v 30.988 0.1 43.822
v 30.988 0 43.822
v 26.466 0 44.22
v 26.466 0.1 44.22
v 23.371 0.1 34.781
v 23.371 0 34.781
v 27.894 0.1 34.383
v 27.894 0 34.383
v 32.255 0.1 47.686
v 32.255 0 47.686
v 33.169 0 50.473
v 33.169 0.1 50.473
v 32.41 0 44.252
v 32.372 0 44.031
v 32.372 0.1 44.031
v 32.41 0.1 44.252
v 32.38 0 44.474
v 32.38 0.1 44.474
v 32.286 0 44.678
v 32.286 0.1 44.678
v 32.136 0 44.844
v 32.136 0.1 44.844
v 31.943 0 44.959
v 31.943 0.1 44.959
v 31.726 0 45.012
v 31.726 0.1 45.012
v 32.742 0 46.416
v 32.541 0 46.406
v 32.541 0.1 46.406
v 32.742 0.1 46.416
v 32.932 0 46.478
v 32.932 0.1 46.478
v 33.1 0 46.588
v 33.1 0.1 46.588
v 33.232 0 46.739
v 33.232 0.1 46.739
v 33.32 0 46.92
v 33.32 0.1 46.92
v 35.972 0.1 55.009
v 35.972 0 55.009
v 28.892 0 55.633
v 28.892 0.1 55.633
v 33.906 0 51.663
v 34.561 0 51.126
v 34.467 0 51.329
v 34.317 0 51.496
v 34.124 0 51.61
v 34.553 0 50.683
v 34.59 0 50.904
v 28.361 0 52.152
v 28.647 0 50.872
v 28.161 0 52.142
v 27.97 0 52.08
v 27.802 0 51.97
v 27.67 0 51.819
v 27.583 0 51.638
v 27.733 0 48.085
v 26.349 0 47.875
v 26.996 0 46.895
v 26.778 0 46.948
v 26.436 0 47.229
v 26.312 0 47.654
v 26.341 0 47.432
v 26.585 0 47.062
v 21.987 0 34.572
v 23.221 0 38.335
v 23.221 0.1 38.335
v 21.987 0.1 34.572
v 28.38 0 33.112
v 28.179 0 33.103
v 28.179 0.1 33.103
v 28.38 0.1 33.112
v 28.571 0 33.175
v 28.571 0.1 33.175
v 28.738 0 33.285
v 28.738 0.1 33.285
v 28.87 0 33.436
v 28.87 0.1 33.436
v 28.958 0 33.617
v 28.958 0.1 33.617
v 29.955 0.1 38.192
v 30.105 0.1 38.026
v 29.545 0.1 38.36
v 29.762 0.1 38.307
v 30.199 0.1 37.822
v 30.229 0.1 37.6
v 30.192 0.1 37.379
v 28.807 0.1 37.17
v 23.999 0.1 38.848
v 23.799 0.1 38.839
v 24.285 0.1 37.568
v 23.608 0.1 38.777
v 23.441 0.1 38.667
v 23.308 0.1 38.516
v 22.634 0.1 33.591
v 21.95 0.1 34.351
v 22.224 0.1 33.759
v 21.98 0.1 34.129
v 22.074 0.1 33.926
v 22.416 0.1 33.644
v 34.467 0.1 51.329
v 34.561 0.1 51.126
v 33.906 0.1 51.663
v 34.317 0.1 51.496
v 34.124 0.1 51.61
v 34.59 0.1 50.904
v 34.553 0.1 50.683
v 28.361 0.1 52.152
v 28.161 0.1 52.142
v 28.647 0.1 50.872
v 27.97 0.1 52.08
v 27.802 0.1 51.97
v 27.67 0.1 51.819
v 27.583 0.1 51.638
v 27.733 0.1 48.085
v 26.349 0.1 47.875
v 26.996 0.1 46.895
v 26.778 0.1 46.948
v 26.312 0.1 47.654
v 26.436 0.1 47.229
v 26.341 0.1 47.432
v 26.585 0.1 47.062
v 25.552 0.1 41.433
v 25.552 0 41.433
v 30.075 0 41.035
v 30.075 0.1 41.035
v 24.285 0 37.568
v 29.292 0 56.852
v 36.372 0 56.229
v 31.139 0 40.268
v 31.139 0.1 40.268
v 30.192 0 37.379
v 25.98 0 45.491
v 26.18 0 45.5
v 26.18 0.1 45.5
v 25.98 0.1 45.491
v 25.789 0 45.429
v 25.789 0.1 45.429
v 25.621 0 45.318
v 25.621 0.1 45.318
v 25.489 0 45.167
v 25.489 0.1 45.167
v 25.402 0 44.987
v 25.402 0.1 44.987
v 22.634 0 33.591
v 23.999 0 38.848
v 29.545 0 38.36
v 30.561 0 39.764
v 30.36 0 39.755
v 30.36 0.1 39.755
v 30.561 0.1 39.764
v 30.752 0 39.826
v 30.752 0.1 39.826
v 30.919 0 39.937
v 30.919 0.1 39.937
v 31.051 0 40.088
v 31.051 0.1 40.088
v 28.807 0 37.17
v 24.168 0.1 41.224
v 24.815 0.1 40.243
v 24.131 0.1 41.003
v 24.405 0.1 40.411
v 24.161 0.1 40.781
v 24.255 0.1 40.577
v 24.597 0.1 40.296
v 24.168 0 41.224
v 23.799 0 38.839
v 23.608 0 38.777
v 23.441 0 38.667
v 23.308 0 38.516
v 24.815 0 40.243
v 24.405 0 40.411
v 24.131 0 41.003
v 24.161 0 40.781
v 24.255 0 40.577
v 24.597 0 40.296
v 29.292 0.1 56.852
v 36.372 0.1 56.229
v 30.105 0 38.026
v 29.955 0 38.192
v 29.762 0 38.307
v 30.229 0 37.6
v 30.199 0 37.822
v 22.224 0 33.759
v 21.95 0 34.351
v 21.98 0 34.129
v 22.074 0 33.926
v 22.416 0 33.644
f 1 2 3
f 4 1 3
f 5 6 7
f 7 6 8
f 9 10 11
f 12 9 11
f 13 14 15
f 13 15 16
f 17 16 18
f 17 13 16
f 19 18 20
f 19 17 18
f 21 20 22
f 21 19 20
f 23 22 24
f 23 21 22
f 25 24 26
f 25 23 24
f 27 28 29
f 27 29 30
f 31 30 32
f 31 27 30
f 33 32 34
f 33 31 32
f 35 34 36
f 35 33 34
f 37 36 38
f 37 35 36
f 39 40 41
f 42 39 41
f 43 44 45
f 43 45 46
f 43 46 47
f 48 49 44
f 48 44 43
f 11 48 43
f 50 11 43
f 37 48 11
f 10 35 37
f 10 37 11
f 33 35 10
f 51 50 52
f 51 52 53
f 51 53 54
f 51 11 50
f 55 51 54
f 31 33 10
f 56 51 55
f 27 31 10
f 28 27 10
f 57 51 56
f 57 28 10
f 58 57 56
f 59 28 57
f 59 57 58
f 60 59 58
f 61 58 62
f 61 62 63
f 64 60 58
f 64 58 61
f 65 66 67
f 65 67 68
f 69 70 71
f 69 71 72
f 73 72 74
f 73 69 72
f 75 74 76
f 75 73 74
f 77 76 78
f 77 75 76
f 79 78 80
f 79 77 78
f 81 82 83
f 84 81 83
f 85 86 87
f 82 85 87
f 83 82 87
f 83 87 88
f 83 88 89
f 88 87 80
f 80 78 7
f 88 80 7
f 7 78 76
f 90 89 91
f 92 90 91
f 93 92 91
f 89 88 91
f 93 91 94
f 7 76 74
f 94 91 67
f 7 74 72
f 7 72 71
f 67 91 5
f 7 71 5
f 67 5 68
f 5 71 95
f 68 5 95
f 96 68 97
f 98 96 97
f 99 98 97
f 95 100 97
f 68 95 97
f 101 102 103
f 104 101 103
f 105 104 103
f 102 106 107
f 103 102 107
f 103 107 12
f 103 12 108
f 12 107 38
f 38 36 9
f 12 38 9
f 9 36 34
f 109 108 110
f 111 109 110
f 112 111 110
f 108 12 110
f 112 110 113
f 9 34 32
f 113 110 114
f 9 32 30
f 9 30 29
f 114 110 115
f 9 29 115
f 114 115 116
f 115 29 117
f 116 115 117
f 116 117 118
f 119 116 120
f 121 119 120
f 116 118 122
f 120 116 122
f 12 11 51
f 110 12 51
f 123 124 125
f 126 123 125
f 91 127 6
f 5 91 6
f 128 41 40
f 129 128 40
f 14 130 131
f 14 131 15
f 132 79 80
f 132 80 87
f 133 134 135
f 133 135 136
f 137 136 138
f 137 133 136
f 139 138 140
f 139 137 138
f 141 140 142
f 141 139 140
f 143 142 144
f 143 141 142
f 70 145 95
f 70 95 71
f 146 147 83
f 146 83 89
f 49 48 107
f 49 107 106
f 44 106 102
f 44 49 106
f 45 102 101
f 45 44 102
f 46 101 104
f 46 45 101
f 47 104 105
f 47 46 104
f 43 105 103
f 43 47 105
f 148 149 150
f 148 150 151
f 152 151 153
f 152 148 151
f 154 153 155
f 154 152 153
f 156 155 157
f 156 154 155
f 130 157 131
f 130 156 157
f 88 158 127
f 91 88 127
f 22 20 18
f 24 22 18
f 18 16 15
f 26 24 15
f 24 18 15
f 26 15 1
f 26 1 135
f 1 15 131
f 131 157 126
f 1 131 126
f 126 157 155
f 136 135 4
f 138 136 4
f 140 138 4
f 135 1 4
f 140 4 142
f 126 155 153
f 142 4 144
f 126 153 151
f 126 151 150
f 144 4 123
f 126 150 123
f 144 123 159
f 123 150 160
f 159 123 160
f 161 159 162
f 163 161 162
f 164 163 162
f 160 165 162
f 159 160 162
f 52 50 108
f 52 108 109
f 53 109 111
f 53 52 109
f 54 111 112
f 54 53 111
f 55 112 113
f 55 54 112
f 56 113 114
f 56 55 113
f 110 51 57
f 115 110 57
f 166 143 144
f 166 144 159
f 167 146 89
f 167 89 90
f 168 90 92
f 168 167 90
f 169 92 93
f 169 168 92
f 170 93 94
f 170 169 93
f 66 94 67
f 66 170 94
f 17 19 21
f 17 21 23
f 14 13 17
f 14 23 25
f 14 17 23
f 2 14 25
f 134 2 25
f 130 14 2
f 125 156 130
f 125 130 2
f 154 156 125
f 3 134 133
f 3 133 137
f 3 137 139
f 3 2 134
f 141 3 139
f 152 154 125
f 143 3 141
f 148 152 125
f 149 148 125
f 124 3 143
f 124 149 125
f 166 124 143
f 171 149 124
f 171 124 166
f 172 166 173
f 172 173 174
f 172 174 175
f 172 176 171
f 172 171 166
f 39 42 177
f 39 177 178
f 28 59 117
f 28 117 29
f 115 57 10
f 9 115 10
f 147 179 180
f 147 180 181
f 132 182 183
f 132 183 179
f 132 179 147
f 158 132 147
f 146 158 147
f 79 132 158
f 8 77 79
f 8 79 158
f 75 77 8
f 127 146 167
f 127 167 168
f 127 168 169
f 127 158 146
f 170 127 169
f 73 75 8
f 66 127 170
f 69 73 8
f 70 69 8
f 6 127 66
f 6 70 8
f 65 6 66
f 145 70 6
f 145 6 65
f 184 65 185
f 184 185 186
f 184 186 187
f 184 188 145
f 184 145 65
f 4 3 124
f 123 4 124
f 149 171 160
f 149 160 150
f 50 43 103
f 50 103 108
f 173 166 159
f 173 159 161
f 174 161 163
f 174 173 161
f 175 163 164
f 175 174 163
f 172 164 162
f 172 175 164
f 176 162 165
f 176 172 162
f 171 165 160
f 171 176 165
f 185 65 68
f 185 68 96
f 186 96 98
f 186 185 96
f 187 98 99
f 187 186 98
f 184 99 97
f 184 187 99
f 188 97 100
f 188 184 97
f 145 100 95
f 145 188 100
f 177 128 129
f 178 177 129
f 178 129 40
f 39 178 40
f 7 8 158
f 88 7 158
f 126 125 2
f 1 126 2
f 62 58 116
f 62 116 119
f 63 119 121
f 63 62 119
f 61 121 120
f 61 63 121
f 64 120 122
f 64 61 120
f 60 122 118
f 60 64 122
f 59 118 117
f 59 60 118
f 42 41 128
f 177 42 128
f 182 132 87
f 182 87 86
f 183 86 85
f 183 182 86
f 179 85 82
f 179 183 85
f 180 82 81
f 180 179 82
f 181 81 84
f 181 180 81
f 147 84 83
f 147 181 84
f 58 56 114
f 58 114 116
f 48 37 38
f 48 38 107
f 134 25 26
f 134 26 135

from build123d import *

# Parameters (mm, degrees)
BOSS_EXTRUDE1_DEPTH   = 0.1
BOSS_EXTRUDE1_2_DEPTH = 0.1
BOSS_EXTRUDE1_3_DEPTH = 0.1
BOSS_EXTRUDE1_4_DEPTH = 0.1


with BuildPart() as part:
    # Sketch1 → Boss-Extrude1 (new body)
    with BuildSketch(Plane(origin=(0, 0, 0), x_dir=(1, 0, 0), z_dir=(0, 1, 0))):
        with BuildLine():
            Line((24.814936785, -40.243096001), (30.360245664, -39.754754547))
            ThreePointArc((30.360245664, -39.754754547), (30.838979213, -39.875779803), (31.138711106, -40.268200133))
            Line((31.138711106, -40.268200133), (32.372388114, -44.03091501))
            ThreePointArc((32.372388114, -44.03091501), (32.285799291, -44.677518274), (31.725509245, -45.0116866))
            Line((31.725509245, -45.0116866), (26.180200366, -45.500028055))
            ThreePointArc((26.180200366, -45.500028055), (25.701466817, -45.379002798), (25.401734924, -44.986582468))
            Line((25.401734924, -44.986582468), (24.168057915, -41.223867592))
            ThreePointArc((24.168057915, -41.223867592), (24.254646739, -40.577264327), (24.814936785, -40.243096001))
        make_face()
        Polygon((25.55210278, -41.433015967), (30.074567356, -41.034750158), (30.98834325, -43.821766634), (26.465878674, -44.220032443), align=None, mode=Mode.SUBTRACT)
    extrude(amount=BOSS_EXTRUDE1_DEPTH)


with BuildPart() as body_2:
    # Sketch1 → Boss-Extrude1 2 (new body)
    with BuildSketch(Plane(origin=(0, 0, 0), x_dir=(1, 0, 0), z_dir=(0, 1, 0))):
        with BuildLine():
            Line((26.995791469, -46.894702788), (32.541100348, -46.406361333))
            ThreePointArc((32.541100348, -46.406361333), (33.019833897, -46.52738659), (33.31956579, -46.91980692))
            Line((33.31956579, -46.91980692), (34.553242798, -50.682521796))
            ThreePointArc((34.553242798, -50.682521796), (34.466653975, -51.329125061), (33.906363929, -51.663293387))
            Line((33.906363929, -51.663293387), (28.36105505, -52.151634841))
            ThreePointArc((28.36105505, -52.151634841), (27.882321501, -52.030609585), (27.582589608, -51.638189254))
            Line((27.582589608, -51.638189254), (26.3489126, -47.875474378))
            ThreePointArc((26.3489126, -47.875474378), (26.435501423, -47.228871114), (26.995791469, -46.894702788))
        make_face()
        Polygon((27.732957464, -48.084622754), (32.25542204, -47.686356944), (33.169197934, -50.473373421), (28.646733358, -50.87163923), align=None, mode=Mode.SUBTRACT)
    extrude(amount=BOSS_EXTRUDE1_2_DEPTH)


with BuildPart() as body_3:
    # Sketch1 → Boss-Extrude1 3 (new body)
    with BuildSketch(Plane(origin=(0, 0, 0), x_dir=(1, 0, 0), z_dir=(0, 1, 0))):
        with BuildLine():
            Line((22.634082101, -33.591489214), (28.179390979, -33.10314776))
            ThreePointArc((28.179390979, -33.10314776), (28.658124528, -33.224173016), (28.957856421, -33.616593347))
            Line((28.957856421, -33.616593347), (30.19153343, -37.379308223))
            ThreePointArc((30.19153343, -37.379308223), (30.104944607, -38.025911487), (29.544654561, -38.360079813))
            Line((29.544654561, -38.360079813), (23.999345682, -38.848421268))
            ThreePointArc((23.999345682, -38.848421268), (23.520612133, -38.727396012), (23.22088024, -38.334975681))
            Line((23.22088024, -38.334975681), (21.987203231, -34.572260805))
            ThreePointArc((21.987203231, -34.572260805), (22.073792054, -33.92565754), (22.634082101, -33.591489214))
        make_face()
        Polygon((23.371248096, -34.78140918), (27.893712672, -34.383143371), (28.807488565, -37.170159847), (24.28502399, -37.568425657), align=None, mode=Mode.SUBTRACT)
    extrude(amount=BOSS_EXTRUDE1_3_DEPTH)


with BuildPart() as body_4:
    # Sketch1 → Boss-Extrude1 4 (new body)
    with BuildSketch(Plane(origin=(0, 0, 0), x_dir=(1, 0, 0), z_dir=(0, 1, 0))):
        Polygon((28.89220652, -55.632520835), (29.292082913, -56.852143835), (36.371658246, -56.228688913), (35.971781853, -55.009065913), align=None)
    extrude(amount=BOSS_EXTRUDE1_4_DEPTH)


solid = Compound([part.part, body_2.part, body_3.part, body_4.part])
